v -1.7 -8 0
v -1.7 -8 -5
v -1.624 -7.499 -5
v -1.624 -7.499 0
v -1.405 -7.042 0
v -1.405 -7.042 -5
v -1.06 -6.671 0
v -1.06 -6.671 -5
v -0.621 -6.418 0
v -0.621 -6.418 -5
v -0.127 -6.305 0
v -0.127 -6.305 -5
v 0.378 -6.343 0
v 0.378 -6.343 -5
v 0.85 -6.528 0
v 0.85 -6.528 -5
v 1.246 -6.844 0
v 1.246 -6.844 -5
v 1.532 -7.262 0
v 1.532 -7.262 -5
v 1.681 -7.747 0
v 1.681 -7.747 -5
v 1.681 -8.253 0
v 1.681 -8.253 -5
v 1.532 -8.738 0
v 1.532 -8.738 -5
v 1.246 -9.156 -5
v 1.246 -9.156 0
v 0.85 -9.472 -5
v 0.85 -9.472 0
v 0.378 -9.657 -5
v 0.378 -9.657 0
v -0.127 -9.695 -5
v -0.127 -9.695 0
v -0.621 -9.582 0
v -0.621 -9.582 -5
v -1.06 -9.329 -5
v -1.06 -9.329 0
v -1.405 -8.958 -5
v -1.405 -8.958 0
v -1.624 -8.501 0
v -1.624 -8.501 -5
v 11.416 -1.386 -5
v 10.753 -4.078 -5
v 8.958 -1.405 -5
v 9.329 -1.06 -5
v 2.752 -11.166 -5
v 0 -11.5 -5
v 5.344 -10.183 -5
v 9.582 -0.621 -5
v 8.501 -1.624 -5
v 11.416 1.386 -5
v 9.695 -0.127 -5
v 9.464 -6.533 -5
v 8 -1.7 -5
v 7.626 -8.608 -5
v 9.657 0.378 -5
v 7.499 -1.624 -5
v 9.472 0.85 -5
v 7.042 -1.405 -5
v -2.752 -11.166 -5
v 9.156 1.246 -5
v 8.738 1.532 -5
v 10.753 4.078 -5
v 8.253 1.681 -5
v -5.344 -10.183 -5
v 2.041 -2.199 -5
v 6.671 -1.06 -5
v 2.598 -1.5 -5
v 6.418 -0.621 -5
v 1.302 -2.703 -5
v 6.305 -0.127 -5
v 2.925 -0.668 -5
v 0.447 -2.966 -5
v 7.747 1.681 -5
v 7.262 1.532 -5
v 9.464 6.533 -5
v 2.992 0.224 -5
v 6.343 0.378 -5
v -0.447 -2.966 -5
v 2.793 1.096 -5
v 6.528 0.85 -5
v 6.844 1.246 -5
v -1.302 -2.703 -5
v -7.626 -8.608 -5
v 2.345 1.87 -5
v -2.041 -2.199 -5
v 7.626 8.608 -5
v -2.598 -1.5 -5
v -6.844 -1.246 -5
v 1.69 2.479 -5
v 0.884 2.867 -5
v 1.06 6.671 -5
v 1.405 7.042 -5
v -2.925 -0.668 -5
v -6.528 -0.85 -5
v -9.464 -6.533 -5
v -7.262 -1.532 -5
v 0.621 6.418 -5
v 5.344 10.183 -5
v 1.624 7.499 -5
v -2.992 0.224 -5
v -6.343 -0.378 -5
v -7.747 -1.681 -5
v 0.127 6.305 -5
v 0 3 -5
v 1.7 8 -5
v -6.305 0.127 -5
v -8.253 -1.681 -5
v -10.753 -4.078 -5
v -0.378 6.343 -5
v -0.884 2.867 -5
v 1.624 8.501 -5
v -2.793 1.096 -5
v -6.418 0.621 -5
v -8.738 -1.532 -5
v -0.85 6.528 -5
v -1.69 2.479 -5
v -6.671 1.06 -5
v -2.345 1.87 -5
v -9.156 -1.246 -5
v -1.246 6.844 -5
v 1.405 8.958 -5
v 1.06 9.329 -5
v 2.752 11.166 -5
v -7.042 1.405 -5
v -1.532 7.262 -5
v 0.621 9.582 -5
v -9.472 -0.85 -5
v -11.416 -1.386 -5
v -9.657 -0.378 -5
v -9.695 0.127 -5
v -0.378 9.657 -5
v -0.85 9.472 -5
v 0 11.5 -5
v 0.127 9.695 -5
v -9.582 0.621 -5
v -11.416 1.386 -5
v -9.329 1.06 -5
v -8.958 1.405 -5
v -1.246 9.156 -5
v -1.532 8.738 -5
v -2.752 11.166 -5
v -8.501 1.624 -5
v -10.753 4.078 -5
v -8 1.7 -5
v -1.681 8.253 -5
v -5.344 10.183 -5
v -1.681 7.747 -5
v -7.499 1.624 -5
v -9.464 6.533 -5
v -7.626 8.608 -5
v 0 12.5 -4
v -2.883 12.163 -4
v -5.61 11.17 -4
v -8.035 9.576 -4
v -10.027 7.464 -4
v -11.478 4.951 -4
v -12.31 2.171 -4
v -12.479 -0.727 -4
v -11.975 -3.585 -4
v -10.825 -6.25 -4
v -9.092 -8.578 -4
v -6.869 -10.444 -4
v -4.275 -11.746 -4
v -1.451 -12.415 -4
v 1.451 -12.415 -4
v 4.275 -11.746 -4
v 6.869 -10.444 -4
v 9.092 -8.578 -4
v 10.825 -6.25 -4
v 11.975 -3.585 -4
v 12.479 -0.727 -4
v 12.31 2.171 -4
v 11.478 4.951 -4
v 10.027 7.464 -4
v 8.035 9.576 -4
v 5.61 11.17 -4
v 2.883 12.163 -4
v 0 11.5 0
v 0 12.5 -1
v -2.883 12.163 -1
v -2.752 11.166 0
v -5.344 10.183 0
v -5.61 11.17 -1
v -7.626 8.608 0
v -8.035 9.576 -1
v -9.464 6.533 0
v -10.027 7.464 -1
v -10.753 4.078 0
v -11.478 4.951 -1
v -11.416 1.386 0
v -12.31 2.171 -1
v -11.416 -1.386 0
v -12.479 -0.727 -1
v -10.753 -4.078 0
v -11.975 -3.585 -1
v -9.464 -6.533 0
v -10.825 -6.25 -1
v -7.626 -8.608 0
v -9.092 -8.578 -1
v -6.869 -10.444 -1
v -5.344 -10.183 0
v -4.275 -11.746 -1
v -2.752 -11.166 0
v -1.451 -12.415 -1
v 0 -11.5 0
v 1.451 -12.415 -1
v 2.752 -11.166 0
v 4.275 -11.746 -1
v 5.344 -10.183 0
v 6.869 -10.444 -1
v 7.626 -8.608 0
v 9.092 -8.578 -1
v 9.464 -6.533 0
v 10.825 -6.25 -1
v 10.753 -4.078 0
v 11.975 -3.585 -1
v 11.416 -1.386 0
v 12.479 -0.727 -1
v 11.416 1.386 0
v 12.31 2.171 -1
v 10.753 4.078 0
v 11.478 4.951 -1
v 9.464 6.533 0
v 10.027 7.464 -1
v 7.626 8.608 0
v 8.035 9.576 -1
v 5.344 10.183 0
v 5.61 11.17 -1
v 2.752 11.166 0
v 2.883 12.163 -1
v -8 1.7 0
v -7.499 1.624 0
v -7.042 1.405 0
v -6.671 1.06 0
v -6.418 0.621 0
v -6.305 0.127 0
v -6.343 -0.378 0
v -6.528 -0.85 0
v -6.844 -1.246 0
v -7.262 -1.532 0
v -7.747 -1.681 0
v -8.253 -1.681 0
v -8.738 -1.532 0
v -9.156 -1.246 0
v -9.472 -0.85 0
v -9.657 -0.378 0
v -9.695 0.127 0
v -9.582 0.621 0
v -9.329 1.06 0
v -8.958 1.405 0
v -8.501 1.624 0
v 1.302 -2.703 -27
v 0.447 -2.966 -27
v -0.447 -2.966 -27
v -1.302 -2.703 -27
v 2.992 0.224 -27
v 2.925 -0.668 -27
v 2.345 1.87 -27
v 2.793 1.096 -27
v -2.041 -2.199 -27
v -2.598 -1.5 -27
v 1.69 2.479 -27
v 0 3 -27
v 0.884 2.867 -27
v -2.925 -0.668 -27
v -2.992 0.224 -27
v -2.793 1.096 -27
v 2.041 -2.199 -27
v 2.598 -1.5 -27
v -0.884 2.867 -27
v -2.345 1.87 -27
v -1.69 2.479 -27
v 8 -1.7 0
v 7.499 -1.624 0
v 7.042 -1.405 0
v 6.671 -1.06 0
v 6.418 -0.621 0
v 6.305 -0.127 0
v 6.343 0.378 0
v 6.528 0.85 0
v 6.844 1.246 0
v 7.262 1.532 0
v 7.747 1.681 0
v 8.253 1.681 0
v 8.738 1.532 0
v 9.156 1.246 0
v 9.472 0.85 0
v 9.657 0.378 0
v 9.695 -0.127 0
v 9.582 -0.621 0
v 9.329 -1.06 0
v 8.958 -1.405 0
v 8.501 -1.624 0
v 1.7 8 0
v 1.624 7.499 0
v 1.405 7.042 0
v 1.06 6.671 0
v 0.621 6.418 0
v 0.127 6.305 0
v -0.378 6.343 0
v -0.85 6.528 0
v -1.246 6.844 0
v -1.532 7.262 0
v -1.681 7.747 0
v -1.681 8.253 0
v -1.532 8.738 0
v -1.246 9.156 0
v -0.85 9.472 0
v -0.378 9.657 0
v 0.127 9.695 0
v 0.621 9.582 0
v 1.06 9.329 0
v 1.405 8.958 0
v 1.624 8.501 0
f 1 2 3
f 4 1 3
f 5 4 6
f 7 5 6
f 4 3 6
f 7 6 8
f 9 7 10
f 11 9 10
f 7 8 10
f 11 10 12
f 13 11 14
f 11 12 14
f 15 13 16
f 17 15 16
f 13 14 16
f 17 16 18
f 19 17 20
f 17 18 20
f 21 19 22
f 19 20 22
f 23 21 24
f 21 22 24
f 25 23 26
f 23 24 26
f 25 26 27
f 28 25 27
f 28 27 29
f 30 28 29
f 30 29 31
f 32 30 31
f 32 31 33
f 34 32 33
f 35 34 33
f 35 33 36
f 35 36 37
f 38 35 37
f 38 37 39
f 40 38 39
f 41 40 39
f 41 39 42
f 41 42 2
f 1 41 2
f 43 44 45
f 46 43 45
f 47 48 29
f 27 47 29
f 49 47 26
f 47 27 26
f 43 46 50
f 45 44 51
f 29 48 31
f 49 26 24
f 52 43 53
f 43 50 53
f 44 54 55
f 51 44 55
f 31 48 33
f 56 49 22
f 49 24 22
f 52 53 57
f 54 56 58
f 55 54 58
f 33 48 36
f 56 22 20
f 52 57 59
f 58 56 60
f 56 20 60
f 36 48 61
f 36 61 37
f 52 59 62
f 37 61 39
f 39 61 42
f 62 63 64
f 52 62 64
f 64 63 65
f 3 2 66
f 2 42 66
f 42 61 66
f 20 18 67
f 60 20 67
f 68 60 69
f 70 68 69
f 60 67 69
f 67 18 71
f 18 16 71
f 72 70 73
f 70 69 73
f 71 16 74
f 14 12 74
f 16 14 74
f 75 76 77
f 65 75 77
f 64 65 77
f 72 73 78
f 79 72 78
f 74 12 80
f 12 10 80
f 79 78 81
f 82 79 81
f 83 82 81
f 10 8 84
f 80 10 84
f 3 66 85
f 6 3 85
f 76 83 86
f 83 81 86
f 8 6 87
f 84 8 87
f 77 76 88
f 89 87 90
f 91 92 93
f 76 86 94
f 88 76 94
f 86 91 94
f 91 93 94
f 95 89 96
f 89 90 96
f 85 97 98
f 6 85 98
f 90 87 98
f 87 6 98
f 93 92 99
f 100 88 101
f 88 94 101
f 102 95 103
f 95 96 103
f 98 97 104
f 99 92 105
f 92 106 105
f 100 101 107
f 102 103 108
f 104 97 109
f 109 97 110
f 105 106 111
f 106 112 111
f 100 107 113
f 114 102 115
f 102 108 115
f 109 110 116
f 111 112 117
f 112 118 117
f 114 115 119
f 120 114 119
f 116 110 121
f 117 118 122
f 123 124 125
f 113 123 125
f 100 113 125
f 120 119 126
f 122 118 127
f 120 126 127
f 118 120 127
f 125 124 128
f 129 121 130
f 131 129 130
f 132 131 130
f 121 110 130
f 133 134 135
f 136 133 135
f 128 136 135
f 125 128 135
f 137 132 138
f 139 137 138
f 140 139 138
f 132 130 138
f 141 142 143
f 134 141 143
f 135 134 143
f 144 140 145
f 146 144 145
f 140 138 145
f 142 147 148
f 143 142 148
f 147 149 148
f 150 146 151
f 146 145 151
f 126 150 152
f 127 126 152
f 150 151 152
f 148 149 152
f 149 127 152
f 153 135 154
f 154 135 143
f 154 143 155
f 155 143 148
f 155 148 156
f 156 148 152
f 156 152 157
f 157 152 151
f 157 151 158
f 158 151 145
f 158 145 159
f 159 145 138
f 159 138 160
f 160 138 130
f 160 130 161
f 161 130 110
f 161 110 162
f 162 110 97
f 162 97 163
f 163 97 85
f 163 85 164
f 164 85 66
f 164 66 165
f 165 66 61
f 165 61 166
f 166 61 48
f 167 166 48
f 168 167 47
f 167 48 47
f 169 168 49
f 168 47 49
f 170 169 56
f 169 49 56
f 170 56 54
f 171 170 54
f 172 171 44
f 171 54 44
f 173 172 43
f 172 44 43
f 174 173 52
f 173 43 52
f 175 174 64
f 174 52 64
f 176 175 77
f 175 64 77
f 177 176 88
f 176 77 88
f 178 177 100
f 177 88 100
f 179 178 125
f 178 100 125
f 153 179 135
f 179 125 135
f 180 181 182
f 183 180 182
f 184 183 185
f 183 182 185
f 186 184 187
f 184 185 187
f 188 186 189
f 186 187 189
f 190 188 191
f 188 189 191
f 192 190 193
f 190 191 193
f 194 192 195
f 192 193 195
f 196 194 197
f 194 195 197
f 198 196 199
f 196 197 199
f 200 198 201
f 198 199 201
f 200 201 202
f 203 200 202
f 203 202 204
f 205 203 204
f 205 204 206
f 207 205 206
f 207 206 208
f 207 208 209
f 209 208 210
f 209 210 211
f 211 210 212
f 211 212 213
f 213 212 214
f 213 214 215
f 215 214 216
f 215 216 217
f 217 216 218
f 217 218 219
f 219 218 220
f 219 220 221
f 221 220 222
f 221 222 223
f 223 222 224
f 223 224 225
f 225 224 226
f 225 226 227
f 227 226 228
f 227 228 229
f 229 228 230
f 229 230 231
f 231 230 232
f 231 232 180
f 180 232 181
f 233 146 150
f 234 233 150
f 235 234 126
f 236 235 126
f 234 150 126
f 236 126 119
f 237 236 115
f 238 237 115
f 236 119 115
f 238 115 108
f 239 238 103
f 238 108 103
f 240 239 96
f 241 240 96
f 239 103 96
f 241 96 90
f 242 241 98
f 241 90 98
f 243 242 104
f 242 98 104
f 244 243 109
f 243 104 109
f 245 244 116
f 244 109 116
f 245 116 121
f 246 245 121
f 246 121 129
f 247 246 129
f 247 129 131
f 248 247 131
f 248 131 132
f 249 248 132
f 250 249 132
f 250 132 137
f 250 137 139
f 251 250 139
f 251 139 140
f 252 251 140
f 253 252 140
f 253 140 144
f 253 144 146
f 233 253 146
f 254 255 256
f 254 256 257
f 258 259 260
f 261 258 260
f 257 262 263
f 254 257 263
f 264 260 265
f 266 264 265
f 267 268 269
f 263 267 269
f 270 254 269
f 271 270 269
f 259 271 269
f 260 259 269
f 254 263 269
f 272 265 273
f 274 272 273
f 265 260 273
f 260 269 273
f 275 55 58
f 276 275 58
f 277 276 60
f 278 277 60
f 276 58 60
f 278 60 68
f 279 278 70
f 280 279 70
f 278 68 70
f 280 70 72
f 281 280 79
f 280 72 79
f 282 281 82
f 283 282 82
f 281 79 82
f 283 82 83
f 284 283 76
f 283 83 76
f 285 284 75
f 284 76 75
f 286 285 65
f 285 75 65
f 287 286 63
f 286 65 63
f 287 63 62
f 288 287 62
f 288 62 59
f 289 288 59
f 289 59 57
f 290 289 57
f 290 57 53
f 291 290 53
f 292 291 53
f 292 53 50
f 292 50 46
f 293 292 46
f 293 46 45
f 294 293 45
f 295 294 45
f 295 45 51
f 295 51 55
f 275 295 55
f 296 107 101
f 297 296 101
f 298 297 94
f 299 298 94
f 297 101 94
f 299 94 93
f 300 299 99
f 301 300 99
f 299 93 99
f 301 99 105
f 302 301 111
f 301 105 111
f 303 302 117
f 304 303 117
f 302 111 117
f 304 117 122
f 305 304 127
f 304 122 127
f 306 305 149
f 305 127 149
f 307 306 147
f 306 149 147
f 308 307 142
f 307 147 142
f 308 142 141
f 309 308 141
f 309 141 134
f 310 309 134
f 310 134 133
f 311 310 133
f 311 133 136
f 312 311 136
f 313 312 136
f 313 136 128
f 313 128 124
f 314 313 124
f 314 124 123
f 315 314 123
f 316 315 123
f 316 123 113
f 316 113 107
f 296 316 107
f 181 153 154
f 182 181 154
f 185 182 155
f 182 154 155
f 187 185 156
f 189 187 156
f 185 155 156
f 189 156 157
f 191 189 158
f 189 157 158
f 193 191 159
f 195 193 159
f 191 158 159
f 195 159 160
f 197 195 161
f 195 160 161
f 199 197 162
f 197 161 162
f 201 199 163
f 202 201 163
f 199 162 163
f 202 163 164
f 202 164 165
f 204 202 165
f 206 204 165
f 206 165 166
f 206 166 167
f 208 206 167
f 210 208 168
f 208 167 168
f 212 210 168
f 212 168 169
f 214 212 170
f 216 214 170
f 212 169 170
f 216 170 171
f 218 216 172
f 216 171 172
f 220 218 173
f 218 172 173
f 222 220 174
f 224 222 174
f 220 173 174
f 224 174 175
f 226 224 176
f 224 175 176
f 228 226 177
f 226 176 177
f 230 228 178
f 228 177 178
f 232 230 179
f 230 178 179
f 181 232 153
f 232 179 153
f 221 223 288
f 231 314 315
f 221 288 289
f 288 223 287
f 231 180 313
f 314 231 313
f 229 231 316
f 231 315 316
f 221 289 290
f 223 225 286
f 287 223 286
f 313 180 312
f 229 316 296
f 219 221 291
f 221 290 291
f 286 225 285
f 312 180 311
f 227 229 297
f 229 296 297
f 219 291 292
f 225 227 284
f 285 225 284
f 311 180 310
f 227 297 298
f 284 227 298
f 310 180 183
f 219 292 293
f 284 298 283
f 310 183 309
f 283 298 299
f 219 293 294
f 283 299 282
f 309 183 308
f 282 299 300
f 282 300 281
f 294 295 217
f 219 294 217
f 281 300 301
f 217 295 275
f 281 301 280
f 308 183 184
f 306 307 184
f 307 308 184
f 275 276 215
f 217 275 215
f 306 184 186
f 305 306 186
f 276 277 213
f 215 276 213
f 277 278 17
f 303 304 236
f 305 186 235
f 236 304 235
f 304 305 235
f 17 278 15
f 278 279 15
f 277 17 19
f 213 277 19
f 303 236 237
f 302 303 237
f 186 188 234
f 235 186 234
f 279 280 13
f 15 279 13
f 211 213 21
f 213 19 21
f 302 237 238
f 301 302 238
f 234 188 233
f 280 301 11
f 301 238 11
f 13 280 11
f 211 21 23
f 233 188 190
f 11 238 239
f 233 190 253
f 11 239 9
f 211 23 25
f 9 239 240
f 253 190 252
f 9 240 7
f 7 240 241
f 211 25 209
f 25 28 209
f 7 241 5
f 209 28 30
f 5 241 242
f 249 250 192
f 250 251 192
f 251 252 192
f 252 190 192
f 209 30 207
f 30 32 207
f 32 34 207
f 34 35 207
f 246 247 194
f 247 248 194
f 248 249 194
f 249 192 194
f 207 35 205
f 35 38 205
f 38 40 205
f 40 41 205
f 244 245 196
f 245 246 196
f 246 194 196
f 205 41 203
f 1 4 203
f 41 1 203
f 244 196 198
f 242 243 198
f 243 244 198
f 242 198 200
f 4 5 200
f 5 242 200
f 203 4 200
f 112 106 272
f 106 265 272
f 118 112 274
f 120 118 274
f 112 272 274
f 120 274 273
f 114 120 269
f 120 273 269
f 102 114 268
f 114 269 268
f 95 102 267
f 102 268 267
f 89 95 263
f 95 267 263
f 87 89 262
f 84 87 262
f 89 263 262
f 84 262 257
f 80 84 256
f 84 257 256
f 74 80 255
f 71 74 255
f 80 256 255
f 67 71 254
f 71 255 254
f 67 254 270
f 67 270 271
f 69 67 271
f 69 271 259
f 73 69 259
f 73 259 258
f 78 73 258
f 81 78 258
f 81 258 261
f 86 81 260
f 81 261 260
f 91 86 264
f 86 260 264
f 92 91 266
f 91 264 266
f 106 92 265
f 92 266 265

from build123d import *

# Parameters (mm, degrees)
M3_CLEARANCE_HOLE1_D = 3.4
CIRPATTERN1_COUNT    = 4
CHAMFER1_SIZE        = 1


with BuildPart() as part:
    # Sketch1 → Revolve1 (revolve)
    with BuildSketch(Plane(origin=(0, 0, 0), x_dir=(0, 0, -1), z_dir=(1, 0, 0))):
        Polygon((0, 0), (0, 12.5), (5, 12.5), (5, 3), (27, 3), (27, 0), align=None)
    revolve(axis=Axis((0, 0, -27), (0, 0, 1)))

    # M3 Clearance Hole1 (through all)
    with Locations(Plane(origin=(8, 0, 0), x_dir=(0, 1, 0), z_dir=(0, 0, 1))):
        with Locations((0, 0)):
            m3_clearance_hole1 = Hole(M3_CLEARANCE_HOLE1_D / 2)

    # CirPattern1: M3 Clearance Hole1 ×4 about axis
    cirpattern1_axis = Axis((0, 0, 0), (0, 0, 1))
    for i in range(1, CIRPATTERN1_COUNT):
        add(m3_clearance_hole1.rotate(cirpattern1_axis, i * 360 / CIRPATTERN1_COUNT), mode=Mode.SUBTRACT)

    # Chamfer1
    chamfer1_edges = [part.edges().sort_by_distance(p)[0] for p in [
        (0, -12.5, -5),
        (0, -12.5, 0),
    ]]
    chamfer(chamfer1_edges, length=CHAMFER1_SIZE)


solid = part.part
